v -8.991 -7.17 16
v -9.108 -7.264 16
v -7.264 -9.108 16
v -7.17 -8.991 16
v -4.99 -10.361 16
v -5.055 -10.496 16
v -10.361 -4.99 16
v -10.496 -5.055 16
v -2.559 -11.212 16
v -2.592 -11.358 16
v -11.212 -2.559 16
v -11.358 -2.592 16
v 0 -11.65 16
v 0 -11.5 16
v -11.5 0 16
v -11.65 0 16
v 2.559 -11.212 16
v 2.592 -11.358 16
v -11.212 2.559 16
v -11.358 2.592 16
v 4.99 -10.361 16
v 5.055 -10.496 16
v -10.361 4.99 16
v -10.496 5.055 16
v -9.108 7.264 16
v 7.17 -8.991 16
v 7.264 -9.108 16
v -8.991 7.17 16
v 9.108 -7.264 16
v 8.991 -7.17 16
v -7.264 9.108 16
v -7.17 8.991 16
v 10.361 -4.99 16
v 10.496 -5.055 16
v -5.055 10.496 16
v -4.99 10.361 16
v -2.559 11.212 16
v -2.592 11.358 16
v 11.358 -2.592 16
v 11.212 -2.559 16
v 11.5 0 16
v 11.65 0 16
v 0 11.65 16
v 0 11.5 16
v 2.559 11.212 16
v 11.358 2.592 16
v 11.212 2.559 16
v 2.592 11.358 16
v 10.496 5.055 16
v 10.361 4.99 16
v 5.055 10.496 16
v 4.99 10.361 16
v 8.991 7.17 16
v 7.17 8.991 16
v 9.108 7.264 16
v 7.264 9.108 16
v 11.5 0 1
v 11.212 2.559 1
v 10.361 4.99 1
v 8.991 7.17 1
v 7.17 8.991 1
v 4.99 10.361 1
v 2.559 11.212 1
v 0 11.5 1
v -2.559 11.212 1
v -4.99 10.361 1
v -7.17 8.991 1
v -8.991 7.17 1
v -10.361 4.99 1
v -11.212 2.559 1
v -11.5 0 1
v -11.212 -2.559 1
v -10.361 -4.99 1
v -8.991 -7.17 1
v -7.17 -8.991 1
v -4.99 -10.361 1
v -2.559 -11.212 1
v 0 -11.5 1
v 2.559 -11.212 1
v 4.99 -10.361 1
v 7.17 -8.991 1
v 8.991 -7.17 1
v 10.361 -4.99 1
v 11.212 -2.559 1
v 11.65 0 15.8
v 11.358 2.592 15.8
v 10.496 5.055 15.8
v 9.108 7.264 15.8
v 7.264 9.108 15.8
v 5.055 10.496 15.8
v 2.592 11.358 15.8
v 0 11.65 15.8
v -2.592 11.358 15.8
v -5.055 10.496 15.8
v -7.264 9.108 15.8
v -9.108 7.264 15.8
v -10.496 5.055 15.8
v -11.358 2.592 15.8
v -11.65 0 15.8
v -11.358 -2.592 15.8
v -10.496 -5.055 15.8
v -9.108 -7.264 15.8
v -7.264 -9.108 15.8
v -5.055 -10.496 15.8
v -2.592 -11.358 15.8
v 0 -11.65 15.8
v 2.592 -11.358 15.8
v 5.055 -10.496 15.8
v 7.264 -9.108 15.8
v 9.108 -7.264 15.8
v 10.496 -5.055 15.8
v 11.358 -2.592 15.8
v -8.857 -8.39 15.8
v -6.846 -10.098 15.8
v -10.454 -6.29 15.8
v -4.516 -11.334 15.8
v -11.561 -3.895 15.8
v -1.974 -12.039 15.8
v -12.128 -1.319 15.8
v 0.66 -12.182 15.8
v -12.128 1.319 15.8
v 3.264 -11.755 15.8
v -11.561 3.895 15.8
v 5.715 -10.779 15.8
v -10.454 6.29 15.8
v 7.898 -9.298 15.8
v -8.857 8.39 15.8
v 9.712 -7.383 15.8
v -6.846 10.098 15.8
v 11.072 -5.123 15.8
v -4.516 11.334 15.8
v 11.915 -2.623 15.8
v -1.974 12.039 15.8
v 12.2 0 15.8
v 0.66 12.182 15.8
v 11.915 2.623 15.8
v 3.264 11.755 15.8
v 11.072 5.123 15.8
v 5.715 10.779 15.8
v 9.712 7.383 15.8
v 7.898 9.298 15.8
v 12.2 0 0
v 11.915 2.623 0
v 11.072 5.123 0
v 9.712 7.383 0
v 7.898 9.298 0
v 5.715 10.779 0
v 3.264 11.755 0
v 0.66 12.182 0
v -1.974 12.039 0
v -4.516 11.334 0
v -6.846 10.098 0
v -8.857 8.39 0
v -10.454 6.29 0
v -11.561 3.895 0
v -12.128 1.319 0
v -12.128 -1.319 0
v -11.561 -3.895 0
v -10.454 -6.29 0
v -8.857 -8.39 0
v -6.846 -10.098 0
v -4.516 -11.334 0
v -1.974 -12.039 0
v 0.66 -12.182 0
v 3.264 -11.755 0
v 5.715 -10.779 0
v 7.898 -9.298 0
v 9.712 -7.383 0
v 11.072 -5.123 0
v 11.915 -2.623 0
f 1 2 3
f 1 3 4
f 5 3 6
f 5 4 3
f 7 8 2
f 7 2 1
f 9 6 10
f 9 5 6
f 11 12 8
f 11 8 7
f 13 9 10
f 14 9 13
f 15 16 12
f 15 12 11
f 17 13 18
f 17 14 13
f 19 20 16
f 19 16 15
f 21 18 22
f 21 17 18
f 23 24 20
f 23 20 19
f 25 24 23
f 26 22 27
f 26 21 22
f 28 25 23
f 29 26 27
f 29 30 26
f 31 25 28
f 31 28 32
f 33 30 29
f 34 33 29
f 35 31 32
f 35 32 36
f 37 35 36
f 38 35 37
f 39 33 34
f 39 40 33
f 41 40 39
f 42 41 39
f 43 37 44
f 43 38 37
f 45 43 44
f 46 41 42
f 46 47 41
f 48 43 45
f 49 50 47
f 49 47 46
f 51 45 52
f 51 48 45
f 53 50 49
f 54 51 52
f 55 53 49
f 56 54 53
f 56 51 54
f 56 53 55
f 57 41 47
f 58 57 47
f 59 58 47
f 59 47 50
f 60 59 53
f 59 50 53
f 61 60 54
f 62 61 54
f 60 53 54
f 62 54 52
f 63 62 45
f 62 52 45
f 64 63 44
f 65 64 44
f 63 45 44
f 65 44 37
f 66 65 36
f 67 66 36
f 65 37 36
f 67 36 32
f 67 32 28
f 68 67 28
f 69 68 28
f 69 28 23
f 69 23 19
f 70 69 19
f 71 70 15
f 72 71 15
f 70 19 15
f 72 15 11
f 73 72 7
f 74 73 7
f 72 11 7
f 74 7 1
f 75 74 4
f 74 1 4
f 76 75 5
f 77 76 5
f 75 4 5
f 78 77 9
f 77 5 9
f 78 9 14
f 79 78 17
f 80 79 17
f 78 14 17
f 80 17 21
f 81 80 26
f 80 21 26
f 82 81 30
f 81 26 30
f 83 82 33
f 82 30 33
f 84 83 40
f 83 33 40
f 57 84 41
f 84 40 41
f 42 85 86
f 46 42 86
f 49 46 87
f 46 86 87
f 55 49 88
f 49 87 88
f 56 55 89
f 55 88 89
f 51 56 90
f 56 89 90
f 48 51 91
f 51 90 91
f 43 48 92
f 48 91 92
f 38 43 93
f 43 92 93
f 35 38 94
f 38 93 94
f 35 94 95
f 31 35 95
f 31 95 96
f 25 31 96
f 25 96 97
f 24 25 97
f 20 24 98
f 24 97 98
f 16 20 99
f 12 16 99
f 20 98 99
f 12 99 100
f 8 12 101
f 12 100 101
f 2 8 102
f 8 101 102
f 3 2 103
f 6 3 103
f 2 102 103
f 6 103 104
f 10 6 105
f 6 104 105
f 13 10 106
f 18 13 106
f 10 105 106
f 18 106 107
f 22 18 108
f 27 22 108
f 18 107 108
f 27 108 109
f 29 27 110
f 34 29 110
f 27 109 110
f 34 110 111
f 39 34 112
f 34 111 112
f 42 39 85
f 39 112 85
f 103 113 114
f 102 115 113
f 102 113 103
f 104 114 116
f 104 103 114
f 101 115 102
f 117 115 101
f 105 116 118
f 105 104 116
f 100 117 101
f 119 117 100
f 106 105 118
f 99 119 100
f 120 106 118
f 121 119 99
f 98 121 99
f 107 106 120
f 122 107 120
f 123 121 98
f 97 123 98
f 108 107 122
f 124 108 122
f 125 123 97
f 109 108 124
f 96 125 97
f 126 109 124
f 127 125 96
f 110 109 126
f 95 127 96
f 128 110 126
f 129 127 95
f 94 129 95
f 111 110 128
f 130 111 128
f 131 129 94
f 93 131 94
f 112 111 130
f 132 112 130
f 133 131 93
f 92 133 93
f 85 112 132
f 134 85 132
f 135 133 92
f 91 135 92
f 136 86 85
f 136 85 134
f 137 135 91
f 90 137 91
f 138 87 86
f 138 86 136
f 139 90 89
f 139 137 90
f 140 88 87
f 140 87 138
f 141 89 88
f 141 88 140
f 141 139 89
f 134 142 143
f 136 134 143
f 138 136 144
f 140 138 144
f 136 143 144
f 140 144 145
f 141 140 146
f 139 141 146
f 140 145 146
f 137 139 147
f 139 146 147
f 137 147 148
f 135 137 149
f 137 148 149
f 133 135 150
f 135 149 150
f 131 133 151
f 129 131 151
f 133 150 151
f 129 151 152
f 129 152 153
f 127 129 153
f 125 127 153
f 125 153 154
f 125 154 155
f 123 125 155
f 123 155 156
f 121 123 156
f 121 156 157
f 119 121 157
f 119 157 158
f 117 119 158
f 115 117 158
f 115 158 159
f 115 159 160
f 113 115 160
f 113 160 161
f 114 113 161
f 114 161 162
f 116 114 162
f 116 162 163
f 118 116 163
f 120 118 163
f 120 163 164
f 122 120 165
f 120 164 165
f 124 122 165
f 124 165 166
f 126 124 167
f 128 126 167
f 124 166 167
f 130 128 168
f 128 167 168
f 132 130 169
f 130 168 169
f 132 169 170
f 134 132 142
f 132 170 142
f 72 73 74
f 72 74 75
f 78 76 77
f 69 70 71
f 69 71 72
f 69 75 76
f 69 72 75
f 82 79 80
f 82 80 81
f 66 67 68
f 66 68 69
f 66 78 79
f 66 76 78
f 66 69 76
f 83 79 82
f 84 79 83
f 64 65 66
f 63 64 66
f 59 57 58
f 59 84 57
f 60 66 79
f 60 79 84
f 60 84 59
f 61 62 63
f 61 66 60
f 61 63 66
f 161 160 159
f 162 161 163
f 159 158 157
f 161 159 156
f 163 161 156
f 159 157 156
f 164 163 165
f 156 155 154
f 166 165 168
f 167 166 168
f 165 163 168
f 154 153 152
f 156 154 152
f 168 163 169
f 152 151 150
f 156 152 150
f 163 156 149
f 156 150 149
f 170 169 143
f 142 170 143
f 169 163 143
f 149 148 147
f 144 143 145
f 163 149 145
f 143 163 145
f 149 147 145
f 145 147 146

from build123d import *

# Parameters (mm, degrees)
SKETCH1_R           = 12.2
BOSS_EXTRUDE1_DEPTH = 16
SKETCH3_R           = 11.5
CUT_EXTRUDE1_DEPTH  = 15
CUT_EXTRUDE2_START  = -0.2
SKETCH2_R           = 12.2
SKETCH2_R_2         = 11.65
CUT_EXTRUDE2_DEPTH  = 0.2


with BuildPart() as part:
    # Sketch1 → Boss-Extrude1 (new body)
    with BuildSketch(Plane.XY):
        Circle(SKETCH1_R)
    extrude(amount=BOSS_EXTRUDE1_DEPTH)

    # Sketch3 → Cut-Extrude1 (cut)
    with BuildSketch(Plane.XY.offset(16)):
        Circle(SKETCH3_R)
    extrude(amount=-CUT_EXTRUDE1_DEPTH, mode=Mode.SUBTRACT)

    # Sketch2 → Cut-Extrude2 (cut)
    with BuildSketch(Plane.XY.offset(16).offset(CUT_EXTRUDE2_START)):
        Circle(SKETCH2_R)
        Circle(SKETCH2_R_2, mode=Mode.SUBTRACT)
    extrude(amount=CUT_EXTRUDE2_DEPTH, mode=Mode.SUBTRACT)


solid = part.part
